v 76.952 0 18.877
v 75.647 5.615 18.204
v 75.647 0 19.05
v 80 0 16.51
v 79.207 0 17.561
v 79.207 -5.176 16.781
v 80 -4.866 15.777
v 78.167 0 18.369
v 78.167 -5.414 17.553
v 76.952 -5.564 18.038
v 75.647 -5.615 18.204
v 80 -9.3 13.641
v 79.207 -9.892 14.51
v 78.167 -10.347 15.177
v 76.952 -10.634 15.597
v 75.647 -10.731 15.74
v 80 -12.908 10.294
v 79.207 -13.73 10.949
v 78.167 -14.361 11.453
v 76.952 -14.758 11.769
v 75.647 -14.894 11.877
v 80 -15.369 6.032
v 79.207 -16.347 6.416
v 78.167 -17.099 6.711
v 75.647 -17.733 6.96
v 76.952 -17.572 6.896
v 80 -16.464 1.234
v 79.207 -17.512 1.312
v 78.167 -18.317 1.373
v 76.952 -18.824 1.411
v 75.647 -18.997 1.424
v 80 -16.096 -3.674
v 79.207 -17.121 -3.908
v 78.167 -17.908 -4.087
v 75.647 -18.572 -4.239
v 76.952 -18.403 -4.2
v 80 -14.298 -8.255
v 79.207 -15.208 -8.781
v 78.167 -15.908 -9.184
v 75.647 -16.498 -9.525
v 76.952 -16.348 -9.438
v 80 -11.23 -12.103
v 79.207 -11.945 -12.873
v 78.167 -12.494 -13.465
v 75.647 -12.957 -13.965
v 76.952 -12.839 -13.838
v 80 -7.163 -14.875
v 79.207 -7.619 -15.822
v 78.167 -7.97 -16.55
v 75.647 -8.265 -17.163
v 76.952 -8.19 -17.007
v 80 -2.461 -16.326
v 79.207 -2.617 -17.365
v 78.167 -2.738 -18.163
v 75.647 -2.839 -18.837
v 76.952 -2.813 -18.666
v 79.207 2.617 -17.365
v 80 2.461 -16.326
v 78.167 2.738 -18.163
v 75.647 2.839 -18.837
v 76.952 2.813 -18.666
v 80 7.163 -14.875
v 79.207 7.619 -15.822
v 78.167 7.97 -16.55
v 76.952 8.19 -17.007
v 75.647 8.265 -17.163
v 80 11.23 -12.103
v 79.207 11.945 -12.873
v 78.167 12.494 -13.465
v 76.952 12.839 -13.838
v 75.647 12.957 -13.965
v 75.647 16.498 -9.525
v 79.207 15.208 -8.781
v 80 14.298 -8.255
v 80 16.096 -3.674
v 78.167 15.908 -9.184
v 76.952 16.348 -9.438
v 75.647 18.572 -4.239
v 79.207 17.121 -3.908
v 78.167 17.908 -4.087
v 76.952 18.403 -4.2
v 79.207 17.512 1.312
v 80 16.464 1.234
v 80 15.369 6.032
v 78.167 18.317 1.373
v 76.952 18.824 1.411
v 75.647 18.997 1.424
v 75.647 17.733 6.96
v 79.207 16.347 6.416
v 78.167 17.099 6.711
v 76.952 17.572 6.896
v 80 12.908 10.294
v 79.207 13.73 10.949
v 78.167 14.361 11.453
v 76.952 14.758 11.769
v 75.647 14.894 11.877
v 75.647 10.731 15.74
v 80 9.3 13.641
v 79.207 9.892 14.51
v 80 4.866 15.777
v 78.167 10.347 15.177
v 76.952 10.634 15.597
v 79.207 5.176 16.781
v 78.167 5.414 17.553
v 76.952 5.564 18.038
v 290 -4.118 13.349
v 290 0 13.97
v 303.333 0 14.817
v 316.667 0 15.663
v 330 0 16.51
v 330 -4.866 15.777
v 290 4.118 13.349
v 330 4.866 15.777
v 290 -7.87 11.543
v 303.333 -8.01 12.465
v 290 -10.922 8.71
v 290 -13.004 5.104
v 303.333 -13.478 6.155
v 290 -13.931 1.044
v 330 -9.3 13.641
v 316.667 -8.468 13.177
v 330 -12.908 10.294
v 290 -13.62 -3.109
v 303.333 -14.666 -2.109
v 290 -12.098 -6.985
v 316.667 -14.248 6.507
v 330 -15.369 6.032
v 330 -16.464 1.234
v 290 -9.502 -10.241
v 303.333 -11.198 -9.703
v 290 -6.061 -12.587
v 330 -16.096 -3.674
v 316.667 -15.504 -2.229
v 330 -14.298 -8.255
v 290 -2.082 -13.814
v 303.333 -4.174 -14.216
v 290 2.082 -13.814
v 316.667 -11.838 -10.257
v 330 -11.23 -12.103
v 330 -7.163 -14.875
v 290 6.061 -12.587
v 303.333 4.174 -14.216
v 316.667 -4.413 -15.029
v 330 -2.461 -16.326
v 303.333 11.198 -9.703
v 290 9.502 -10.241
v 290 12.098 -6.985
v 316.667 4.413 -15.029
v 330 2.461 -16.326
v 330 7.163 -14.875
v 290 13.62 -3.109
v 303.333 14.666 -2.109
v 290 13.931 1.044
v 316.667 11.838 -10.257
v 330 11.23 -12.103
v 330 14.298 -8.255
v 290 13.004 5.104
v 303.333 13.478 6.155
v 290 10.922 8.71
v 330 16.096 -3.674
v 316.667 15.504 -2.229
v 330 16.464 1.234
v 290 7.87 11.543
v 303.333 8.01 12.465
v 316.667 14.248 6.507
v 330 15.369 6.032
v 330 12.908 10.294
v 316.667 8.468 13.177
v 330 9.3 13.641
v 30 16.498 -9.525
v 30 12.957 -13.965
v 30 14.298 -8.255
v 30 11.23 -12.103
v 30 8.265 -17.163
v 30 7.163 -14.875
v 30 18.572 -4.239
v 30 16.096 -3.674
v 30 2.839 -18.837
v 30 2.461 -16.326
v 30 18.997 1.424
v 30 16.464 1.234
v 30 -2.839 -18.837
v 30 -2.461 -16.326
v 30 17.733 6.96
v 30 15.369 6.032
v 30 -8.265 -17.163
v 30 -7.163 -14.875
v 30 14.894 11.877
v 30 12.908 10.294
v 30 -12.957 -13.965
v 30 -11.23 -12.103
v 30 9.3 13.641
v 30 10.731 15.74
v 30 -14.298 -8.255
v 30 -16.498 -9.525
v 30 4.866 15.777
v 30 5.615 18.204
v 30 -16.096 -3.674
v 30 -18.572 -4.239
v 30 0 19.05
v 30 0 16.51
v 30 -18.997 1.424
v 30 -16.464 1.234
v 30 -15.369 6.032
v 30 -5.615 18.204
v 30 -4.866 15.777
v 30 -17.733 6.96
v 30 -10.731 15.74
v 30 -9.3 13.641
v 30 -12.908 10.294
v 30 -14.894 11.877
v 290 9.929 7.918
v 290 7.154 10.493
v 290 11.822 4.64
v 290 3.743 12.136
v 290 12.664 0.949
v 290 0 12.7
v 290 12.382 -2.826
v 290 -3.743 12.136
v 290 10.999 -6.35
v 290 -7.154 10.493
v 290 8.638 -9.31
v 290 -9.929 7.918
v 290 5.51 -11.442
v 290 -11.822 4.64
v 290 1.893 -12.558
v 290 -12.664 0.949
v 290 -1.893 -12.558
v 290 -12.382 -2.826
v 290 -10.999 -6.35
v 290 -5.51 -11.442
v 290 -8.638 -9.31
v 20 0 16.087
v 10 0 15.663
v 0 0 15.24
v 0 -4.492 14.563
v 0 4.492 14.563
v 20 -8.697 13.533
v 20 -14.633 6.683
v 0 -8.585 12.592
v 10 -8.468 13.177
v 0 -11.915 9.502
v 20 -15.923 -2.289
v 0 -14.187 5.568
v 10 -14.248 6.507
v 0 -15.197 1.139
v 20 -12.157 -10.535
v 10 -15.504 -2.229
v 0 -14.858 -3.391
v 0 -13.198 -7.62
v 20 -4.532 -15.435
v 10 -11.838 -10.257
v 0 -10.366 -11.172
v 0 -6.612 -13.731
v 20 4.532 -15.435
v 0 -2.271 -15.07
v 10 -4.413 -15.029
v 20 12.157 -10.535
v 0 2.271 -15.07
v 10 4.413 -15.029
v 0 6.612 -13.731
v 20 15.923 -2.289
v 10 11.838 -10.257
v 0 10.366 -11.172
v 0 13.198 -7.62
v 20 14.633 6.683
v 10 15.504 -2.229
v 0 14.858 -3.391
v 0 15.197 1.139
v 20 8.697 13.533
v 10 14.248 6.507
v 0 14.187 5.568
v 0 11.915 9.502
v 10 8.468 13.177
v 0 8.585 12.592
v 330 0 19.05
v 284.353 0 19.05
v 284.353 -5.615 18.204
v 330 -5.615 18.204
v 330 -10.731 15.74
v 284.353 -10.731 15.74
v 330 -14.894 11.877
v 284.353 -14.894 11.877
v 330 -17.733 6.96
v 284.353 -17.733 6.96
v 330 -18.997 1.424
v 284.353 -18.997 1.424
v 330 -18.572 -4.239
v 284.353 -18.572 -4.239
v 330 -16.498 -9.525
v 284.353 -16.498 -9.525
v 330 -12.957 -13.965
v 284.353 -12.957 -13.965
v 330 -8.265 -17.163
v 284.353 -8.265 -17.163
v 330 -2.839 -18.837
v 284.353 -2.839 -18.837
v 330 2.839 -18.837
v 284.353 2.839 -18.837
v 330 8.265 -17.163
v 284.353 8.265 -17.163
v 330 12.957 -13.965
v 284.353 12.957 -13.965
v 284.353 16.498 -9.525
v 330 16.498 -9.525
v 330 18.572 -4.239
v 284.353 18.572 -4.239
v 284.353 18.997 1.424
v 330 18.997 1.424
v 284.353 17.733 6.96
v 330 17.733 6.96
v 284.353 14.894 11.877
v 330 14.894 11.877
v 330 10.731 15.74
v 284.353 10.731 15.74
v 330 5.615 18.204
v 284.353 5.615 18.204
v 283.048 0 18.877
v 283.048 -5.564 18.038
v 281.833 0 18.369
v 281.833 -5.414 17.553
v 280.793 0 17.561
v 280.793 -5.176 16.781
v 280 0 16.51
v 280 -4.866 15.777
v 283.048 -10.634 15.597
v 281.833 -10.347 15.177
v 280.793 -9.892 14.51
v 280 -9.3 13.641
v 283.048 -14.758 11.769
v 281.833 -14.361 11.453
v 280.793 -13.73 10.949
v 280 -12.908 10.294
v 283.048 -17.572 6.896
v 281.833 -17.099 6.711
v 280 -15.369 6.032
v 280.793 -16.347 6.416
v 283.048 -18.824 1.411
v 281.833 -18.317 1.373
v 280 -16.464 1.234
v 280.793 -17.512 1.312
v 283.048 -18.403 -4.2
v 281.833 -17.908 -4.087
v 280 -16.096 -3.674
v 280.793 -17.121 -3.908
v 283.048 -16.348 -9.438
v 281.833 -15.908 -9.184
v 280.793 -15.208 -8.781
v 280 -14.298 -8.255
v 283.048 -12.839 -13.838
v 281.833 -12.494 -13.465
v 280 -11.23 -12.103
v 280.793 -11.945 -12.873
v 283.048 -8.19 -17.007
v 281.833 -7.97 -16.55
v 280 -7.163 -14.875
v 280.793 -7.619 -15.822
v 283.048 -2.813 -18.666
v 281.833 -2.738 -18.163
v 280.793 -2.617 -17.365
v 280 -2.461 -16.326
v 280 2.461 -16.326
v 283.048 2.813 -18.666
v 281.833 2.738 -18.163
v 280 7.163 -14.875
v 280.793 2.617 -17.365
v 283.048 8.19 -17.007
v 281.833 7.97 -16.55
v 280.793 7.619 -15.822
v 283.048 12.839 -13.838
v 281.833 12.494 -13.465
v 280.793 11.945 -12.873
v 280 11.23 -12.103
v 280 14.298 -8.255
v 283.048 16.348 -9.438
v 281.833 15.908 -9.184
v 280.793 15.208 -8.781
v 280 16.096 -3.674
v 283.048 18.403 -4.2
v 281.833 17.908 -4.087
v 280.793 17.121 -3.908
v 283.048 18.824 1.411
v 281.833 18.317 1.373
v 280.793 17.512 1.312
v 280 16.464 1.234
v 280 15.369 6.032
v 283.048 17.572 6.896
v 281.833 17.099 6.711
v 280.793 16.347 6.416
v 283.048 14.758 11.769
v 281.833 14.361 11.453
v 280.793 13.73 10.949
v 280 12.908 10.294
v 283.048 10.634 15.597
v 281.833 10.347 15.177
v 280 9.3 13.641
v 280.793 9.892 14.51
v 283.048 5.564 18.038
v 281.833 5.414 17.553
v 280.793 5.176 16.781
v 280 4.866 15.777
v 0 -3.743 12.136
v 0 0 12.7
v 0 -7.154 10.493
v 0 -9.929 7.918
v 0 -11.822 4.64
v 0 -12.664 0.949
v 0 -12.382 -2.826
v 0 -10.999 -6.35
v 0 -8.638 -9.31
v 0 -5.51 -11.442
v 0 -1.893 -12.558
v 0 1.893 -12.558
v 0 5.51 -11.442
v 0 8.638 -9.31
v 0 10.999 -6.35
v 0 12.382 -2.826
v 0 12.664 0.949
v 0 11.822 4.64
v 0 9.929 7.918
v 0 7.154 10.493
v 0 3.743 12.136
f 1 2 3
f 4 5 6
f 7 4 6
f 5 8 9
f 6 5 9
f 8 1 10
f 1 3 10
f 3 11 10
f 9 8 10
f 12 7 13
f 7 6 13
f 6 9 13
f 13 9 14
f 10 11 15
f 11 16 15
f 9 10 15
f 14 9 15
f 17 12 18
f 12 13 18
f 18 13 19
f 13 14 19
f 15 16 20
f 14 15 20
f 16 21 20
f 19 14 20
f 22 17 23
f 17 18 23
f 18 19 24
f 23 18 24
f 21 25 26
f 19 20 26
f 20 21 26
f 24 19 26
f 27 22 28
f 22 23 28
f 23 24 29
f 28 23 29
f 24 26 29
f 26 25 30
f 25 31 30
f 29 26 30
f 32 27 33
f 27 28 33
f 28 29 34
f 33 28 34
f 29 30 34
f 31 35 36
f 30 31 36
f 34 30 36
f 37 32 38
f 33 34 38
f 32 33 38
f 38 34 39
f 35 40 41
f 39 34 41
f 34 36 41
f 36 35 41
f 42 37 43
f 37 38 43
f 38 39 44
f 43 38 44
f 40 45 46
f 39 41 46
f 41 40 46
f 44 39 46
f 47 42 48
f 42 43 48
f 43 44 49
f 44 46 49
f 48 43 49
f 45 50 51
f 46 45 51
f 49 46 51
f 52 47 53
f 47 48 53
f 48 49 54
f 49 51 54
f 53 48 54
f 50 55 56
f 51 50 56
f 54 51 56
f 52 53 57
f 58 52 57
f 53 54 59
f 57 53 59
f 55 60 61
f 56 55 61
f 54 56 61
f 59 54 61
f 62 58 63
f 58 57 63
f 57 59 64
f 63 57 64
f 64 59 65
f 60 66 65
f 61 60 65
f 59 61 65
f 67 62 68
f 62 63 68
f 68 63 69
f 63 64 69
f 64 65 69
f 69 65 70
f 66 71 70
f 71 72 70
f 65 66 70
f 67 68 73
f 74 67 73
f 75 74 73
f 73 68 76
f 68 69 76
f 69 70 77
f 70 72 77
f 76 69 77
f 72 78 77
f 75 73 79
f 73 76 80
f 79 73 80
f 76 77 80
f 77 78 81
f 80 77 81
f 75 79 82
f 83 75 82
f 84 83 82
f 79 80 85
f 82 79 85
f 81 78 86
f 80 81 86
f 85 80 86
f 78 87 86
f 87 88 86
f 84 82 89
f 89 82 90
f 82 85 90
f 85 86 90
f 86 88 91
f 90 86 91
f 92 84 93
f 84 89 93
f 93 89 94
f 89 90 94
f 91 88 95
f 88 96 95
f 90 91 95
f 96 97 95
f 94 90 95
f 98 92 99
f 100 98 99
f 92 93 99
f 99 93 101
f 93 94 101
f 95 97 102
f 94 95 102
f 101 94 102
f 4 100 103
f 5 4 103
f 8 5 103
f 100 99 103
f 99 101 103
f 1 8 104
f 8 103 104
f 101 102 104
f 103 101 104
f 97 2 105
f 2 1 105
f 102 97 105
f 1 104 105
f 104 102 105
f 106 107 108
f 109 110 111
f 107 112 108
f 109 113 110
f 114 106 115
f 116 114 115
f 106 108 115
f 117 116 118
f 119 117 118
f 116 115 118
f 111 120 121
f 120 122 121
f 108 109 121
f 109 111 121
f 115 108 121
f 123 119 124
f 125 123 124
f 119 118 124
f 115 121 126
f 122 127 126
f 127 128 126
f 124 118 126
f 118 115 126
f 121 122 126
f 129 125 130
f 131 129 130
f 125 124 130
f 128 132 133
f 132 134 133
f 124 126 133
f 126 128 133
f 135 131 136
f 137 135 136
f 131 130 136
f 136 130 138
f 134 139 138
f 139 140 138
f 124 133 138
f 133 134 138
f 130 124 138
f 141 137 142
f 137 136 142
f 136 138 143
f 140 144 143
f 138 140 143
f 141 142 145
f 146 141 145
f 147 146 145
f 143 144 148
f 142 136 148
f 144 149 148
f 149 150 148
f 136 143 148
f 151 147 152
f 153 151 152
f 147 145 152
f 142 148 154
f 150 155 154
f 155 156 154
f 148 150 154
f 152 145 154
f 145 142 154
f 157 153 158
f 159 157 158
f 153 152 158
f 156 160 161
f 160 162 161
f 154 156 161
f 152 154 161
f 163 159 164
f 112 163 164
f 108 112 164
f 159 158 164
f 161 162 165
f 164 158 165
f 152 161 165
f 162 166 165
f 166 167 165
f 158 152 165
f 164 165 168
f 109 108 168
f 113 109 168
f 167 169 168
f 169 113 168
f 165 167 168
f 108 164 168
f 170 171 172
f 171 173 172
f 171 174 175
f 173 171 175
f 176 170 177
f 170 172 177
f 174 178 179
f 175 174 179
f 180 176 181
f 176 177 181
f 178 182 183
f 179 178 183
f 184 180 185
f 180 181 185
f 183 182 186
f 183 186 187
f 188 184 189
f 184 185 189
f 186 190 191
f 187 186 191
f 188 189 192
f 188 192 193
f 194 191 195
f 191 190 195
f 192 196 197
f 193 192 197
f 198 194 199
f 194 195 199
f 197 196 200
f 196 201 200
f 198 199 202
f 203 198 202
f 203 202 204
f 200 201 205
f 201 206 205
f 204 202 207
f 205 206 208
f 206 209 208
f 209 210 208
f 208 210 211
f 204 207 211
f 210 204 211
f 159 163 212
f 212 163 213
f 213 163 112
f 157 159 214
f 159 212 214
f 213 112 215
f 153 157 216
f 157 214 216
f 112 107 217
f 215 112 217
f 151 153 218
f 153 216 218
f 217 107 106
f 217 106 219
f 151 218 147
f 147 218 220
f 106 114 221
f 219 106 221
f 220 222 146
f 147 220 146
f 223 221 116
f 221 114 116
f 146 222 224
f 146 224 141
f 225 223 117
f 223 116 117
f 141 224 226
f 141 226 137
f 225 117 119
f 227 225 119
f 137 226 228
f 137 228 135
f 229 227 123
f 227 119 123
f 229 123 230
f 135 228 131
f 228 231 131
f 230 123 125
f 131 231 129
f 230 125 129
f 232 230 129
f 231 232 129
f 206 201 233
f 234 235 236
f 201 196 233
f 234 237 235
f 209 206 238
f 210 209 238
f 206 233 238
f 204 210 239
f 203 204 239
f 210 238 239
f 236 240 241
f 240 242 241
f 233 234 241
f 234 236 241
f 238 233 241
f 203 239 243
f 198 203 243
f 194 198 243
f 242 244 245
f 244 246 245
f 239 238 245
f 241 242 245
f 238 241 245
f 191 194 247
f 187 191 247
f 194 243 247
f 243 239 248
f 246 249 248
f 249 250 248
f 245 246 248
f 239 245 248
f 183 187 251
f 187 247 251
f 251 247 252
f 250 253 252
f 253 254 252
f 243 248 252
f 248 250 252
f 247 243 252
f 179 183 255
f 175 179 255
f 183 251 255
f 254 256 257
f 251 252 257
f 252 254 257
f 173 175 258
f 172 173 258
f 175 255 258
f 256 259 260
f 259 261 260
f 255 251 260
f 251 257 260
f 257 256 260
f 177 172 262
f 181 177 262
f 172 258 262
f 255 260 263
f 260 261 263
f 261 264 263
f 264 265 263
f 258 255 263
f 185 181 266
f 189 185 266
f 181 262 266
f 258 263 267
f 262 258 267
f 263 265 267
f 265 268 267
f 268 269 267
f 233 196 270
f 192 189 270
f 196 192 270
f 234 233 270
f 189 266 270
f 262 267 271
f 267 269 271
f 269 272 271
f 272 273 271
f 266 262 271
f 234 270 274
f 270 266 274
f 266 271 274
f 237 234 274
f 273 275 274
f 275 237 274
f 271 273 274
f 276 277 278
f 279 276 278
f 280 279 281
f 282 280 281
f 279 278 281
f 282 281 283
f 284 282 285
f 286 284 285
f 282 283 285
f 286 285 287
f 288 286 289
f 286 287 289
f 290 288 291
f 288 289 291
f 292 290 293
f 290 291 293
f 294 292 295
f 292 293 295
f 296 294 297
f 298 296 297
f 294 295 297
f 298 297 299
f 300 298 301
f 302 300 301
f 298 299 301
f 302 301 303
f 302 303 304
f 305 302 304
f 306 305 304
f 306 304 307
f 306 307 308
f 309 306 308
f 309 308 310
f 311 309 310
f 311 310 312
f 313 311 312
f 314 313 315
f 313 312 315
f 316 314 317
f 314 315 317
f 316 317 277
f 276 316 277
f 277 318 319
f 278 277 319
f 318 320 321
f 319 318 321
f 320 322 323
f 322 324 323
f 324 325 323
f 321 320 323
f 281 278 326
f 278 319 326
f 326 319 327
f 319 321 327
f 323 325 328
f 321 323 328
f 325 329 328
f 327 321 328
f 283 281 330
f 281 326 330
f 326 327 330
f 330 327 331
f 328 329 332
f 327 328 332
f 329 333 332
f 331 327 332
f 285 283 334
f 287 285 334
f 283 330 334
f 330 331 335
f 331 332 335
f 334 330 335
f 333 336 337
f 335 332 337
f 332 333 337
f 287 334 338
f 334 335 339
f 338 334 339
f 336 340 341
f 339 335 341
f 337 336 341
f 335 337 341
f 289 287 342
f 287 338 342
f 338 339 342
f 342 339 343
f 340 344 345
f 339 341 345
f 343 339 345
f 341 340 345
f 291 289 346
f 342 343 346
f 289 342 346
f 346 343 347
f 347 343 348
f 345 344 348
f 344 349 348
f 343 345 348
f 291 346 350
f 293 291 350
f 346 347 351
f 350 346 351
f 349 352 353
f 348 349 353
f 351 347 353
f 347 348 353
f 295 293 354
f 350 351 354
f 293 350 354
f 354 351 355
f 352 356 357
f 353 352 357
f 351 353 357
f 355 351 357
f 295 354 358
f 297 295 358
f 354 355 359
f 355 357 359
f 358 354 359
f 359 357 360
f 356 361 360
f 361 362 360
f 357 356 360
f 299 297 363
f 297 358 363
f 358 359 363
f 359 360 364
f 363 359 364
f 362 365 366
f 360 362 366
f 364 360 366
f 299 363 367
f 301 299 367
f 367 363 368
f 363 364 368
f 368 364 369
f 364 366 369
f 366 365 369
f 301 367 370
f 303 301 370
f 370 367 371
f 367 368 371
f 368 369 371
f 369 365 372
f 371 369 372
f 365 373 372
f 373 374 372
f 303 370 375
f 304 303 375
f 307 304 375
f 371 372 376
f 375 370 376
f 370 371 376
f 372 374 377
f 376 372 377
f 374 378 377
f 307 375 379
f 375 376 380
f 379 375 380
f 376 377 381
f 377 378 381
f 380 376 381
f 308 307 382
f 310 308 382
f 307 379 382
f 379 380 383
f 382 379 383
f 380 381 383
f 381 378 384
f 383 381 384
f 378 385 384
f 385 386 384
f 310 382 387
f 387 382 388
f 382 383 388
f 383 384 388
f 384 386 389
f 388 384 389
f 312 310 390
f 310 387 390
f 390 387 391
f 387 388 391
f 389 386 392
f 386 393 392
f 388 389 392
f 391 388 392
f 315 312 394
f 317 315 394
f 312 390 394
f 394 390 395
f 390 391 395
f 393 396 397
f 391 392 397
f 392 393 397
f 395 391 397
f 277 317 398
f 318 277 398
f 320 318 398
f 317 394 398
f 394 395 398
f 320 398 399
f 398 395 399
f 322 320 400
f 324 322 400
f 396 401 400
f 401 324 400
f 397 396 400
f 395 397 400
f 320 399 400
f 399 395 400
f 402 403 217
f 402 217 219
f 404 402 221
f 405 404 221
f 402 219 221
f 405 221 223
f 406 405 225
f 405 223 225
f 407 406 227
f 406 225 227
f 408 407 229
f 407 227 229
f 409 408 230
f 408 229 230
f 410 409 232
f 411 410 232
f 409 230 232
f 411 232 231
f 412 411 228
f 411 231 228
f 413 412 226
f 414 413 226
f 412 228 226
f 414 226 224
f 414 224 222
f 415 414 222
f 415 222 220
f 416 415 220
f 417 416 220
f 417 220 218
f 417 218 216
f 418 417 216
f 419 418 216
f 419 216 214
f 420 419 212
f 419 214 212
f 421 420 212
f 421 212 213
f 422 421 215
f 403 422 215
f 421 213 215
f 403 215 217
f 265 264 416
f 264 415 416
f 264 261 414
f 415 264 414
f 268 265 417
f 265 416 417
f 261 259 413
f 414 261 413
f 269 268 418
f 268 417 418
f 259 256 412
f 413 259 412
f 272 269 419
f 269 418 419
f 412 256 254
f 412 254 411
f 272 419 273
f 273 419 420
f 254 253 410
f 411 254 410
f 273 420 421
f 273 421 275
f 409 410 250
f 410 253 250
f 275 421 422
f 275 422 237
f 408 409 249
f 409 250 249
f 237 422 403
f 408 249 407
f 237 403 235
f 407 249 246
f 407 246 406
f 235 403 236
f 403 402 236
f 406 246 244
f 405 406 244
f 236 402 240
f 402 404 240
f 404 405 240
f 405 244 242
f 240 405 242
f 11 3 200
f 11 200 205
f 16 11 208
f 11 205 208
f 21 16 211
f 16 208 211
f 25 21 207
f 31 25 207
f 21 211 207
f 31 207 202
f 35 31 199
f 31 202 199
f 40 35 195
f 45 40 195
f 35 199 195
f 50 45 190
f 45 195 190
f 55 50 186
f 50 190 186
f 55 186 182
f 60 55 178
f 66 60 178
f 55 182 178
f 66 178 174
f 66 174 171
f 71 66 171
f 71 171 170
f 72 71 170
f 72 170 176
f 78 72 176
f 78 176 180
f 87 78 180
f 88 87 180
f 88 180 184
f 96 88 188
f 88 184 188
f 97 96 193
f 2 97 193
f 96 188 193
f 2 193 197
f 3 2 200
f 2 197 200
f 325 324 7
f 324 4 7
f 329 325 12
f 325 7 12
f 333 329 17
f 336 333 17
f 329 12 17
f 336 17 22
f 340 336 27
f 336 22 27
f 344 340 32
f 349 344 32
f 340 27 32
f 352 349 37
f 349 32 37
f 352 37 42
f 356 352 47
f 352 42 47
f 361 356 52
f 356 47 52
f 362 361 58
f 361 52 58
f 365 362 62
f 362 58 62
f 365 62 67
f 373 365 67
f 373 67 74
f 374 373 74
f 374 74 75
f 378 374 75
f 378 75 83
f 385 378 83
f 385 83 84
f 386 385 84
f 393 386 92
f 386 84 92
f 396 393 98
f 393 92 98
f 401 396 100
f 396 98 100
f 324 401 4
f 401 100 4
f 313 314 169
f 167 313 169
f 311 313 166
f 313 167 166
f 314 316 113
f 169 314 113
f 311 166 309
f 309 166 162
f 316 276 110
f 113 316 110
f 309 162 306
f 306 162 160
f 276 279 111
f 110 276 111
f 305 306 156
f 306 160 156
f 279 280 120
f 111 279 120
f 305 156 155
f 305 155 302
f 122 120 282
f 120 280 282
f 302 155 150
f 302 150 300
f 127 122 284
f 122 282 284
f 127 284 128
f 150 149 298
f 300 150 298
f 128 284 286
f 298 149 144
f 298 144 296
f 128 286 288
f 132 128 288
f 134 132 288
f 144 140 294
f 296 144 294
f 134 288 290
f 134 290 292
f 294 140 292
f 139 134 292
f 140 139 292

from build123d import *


# Not quite as in the source:
# - a fillet or chamfer that OpenCascade refuses, or shapes differently, is made with other operations: its cross-section is extruded or revolved along the edge and cut away or added


with BuildPart() as f2:
    # F0 (on Front) → F2 (revolve)
    with BuildSketch(Plane.XZ):
        Polygon((0, 15.24), (0, 12.7), (30, 12.7), (290, 12.7), (290, 13.97), (330, 16.51), (330, 19.05), (280, 19.05), (280, 16.51), (80, 16.51), (80, 19.05), (30, 19.05), (30, 16.51), align=None)
    revolve(axis=Axis((0, 0, 0), (1, 0, 0)))

    # F3: fillet of radius 5 on 2 edges, made by hand

    # F3_s1 → F3_t2 (revolve, cut)
    with BuildSketch(Plane.XZ):
        with BuildLine():
            ThreePointArc((80, 16.51), (78.1669446402, 18.3685645763), (75.6470240065, 19.05))
            Line((75.6470240065, 19.05), (75.6470240065, 19.15))
            Line((75.6470240065, 19.15), (80, 19.15))
            Line((80, 19.15), (80.1, 19.05))
            ThreePointArc((80.1, 19.05), (80.1, 17.78), (80.0870595199, 16.5592))
            Line((80.0870595199, 16.5592), (80, 16.51))
        make_face()
    revolve(axis=Axis((80, 0, 0), (1, 0, 0)), mode=Mode.SUBTRACT)

    # F3_s3 → F3_t4 (revolve, cut)
    with BuildSketch(Plane.XZ):
        with BuildLine():
            ThreePointArc((284.3529759935, 19.05), (281.8330553598, 18.3685645763), (280, 16.51))
            Line((280, 16.51), (279.9129404801, 16.5592))
            ThreePointArc((279.9129404801, 16.5592), (279.9, 17.78), (279.9, 19.05))
            Line((279.9, 19.05), (280, 19.15))
            Line((280, 19.15), (284.3529759935, 19.15))
            Line((284.3529759935, 19.15), (284.3529759935, 19.05))
        make_face()
    revolve(axis=Axis((280, 0, 0), (1, 0, 0)), mode=Mode.SUBTRACT)


solid = f2.part
